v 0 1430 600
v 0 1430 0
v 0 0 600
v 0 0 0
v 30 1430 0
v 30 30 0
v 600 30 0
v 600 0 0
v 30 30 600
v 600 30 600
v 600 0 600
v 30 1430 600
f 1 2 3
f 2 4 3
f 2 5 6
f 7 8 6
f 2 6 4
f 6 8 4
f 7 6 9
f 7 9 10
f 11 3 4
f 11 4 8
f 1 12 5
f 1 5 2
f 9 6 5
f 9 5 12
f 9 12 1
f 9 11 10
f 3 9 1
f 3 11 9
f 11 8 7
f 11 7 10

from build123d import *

# Parameters (mm, degrees)
F0_W     = 500
F0_H     = 50
F0_H_2   = 224.9779105186
F0_H_3   = 225.0220894814
F1_DEPTH = 30
F2_W     = 30
F2_H     = 600
F3_DEPTH = 1400


with BuildPart() as f1:
    # F0 (on Front) → F1 (new body)
    with BuildSketch(Plane.XZ):
        Polygon((0, 600), (0, 0), (50, 0), (50, 50), (50, 275.0220894814), (50, 325.0220894814), (50, 550), (50, 600), align=None)
        with Locations((300, 575)):
            Rectangle(F0_W, F0_H)
        with Locations((300, 437.5110447407)):
            Rectangle(F0_W, F0_H_2)
        with Locations((300, 300.0220894814)):
            Rectangle(F0_W, F0_H)
        with Locations((300, 162.5110447407)):
            Rectangle(F0_W, F0_H_3)
        with Locations((300, 25)):
            Rectangle(F0_W, F0_H)
        Polygon((550, 50), (550, 0), (600, 0), (600, 600), (550, 600), (550, 550), (550, 325.0220894814), (550, 275.0220894814), align=None)
    extrude(amount=-F1_DEPTH)

    # F2 (on face) → F3 (join)
    with BuildSketch(Plane(origin=(0, 30, 0), x_dir=(-1, 0, 0), z_dir=(0, 1, 0))):
        with Locations((-15, 300)):
            Rectangle(F2_W, F2_H)
    extrude(amount=F3_DEPTH)


solid = f1.part
